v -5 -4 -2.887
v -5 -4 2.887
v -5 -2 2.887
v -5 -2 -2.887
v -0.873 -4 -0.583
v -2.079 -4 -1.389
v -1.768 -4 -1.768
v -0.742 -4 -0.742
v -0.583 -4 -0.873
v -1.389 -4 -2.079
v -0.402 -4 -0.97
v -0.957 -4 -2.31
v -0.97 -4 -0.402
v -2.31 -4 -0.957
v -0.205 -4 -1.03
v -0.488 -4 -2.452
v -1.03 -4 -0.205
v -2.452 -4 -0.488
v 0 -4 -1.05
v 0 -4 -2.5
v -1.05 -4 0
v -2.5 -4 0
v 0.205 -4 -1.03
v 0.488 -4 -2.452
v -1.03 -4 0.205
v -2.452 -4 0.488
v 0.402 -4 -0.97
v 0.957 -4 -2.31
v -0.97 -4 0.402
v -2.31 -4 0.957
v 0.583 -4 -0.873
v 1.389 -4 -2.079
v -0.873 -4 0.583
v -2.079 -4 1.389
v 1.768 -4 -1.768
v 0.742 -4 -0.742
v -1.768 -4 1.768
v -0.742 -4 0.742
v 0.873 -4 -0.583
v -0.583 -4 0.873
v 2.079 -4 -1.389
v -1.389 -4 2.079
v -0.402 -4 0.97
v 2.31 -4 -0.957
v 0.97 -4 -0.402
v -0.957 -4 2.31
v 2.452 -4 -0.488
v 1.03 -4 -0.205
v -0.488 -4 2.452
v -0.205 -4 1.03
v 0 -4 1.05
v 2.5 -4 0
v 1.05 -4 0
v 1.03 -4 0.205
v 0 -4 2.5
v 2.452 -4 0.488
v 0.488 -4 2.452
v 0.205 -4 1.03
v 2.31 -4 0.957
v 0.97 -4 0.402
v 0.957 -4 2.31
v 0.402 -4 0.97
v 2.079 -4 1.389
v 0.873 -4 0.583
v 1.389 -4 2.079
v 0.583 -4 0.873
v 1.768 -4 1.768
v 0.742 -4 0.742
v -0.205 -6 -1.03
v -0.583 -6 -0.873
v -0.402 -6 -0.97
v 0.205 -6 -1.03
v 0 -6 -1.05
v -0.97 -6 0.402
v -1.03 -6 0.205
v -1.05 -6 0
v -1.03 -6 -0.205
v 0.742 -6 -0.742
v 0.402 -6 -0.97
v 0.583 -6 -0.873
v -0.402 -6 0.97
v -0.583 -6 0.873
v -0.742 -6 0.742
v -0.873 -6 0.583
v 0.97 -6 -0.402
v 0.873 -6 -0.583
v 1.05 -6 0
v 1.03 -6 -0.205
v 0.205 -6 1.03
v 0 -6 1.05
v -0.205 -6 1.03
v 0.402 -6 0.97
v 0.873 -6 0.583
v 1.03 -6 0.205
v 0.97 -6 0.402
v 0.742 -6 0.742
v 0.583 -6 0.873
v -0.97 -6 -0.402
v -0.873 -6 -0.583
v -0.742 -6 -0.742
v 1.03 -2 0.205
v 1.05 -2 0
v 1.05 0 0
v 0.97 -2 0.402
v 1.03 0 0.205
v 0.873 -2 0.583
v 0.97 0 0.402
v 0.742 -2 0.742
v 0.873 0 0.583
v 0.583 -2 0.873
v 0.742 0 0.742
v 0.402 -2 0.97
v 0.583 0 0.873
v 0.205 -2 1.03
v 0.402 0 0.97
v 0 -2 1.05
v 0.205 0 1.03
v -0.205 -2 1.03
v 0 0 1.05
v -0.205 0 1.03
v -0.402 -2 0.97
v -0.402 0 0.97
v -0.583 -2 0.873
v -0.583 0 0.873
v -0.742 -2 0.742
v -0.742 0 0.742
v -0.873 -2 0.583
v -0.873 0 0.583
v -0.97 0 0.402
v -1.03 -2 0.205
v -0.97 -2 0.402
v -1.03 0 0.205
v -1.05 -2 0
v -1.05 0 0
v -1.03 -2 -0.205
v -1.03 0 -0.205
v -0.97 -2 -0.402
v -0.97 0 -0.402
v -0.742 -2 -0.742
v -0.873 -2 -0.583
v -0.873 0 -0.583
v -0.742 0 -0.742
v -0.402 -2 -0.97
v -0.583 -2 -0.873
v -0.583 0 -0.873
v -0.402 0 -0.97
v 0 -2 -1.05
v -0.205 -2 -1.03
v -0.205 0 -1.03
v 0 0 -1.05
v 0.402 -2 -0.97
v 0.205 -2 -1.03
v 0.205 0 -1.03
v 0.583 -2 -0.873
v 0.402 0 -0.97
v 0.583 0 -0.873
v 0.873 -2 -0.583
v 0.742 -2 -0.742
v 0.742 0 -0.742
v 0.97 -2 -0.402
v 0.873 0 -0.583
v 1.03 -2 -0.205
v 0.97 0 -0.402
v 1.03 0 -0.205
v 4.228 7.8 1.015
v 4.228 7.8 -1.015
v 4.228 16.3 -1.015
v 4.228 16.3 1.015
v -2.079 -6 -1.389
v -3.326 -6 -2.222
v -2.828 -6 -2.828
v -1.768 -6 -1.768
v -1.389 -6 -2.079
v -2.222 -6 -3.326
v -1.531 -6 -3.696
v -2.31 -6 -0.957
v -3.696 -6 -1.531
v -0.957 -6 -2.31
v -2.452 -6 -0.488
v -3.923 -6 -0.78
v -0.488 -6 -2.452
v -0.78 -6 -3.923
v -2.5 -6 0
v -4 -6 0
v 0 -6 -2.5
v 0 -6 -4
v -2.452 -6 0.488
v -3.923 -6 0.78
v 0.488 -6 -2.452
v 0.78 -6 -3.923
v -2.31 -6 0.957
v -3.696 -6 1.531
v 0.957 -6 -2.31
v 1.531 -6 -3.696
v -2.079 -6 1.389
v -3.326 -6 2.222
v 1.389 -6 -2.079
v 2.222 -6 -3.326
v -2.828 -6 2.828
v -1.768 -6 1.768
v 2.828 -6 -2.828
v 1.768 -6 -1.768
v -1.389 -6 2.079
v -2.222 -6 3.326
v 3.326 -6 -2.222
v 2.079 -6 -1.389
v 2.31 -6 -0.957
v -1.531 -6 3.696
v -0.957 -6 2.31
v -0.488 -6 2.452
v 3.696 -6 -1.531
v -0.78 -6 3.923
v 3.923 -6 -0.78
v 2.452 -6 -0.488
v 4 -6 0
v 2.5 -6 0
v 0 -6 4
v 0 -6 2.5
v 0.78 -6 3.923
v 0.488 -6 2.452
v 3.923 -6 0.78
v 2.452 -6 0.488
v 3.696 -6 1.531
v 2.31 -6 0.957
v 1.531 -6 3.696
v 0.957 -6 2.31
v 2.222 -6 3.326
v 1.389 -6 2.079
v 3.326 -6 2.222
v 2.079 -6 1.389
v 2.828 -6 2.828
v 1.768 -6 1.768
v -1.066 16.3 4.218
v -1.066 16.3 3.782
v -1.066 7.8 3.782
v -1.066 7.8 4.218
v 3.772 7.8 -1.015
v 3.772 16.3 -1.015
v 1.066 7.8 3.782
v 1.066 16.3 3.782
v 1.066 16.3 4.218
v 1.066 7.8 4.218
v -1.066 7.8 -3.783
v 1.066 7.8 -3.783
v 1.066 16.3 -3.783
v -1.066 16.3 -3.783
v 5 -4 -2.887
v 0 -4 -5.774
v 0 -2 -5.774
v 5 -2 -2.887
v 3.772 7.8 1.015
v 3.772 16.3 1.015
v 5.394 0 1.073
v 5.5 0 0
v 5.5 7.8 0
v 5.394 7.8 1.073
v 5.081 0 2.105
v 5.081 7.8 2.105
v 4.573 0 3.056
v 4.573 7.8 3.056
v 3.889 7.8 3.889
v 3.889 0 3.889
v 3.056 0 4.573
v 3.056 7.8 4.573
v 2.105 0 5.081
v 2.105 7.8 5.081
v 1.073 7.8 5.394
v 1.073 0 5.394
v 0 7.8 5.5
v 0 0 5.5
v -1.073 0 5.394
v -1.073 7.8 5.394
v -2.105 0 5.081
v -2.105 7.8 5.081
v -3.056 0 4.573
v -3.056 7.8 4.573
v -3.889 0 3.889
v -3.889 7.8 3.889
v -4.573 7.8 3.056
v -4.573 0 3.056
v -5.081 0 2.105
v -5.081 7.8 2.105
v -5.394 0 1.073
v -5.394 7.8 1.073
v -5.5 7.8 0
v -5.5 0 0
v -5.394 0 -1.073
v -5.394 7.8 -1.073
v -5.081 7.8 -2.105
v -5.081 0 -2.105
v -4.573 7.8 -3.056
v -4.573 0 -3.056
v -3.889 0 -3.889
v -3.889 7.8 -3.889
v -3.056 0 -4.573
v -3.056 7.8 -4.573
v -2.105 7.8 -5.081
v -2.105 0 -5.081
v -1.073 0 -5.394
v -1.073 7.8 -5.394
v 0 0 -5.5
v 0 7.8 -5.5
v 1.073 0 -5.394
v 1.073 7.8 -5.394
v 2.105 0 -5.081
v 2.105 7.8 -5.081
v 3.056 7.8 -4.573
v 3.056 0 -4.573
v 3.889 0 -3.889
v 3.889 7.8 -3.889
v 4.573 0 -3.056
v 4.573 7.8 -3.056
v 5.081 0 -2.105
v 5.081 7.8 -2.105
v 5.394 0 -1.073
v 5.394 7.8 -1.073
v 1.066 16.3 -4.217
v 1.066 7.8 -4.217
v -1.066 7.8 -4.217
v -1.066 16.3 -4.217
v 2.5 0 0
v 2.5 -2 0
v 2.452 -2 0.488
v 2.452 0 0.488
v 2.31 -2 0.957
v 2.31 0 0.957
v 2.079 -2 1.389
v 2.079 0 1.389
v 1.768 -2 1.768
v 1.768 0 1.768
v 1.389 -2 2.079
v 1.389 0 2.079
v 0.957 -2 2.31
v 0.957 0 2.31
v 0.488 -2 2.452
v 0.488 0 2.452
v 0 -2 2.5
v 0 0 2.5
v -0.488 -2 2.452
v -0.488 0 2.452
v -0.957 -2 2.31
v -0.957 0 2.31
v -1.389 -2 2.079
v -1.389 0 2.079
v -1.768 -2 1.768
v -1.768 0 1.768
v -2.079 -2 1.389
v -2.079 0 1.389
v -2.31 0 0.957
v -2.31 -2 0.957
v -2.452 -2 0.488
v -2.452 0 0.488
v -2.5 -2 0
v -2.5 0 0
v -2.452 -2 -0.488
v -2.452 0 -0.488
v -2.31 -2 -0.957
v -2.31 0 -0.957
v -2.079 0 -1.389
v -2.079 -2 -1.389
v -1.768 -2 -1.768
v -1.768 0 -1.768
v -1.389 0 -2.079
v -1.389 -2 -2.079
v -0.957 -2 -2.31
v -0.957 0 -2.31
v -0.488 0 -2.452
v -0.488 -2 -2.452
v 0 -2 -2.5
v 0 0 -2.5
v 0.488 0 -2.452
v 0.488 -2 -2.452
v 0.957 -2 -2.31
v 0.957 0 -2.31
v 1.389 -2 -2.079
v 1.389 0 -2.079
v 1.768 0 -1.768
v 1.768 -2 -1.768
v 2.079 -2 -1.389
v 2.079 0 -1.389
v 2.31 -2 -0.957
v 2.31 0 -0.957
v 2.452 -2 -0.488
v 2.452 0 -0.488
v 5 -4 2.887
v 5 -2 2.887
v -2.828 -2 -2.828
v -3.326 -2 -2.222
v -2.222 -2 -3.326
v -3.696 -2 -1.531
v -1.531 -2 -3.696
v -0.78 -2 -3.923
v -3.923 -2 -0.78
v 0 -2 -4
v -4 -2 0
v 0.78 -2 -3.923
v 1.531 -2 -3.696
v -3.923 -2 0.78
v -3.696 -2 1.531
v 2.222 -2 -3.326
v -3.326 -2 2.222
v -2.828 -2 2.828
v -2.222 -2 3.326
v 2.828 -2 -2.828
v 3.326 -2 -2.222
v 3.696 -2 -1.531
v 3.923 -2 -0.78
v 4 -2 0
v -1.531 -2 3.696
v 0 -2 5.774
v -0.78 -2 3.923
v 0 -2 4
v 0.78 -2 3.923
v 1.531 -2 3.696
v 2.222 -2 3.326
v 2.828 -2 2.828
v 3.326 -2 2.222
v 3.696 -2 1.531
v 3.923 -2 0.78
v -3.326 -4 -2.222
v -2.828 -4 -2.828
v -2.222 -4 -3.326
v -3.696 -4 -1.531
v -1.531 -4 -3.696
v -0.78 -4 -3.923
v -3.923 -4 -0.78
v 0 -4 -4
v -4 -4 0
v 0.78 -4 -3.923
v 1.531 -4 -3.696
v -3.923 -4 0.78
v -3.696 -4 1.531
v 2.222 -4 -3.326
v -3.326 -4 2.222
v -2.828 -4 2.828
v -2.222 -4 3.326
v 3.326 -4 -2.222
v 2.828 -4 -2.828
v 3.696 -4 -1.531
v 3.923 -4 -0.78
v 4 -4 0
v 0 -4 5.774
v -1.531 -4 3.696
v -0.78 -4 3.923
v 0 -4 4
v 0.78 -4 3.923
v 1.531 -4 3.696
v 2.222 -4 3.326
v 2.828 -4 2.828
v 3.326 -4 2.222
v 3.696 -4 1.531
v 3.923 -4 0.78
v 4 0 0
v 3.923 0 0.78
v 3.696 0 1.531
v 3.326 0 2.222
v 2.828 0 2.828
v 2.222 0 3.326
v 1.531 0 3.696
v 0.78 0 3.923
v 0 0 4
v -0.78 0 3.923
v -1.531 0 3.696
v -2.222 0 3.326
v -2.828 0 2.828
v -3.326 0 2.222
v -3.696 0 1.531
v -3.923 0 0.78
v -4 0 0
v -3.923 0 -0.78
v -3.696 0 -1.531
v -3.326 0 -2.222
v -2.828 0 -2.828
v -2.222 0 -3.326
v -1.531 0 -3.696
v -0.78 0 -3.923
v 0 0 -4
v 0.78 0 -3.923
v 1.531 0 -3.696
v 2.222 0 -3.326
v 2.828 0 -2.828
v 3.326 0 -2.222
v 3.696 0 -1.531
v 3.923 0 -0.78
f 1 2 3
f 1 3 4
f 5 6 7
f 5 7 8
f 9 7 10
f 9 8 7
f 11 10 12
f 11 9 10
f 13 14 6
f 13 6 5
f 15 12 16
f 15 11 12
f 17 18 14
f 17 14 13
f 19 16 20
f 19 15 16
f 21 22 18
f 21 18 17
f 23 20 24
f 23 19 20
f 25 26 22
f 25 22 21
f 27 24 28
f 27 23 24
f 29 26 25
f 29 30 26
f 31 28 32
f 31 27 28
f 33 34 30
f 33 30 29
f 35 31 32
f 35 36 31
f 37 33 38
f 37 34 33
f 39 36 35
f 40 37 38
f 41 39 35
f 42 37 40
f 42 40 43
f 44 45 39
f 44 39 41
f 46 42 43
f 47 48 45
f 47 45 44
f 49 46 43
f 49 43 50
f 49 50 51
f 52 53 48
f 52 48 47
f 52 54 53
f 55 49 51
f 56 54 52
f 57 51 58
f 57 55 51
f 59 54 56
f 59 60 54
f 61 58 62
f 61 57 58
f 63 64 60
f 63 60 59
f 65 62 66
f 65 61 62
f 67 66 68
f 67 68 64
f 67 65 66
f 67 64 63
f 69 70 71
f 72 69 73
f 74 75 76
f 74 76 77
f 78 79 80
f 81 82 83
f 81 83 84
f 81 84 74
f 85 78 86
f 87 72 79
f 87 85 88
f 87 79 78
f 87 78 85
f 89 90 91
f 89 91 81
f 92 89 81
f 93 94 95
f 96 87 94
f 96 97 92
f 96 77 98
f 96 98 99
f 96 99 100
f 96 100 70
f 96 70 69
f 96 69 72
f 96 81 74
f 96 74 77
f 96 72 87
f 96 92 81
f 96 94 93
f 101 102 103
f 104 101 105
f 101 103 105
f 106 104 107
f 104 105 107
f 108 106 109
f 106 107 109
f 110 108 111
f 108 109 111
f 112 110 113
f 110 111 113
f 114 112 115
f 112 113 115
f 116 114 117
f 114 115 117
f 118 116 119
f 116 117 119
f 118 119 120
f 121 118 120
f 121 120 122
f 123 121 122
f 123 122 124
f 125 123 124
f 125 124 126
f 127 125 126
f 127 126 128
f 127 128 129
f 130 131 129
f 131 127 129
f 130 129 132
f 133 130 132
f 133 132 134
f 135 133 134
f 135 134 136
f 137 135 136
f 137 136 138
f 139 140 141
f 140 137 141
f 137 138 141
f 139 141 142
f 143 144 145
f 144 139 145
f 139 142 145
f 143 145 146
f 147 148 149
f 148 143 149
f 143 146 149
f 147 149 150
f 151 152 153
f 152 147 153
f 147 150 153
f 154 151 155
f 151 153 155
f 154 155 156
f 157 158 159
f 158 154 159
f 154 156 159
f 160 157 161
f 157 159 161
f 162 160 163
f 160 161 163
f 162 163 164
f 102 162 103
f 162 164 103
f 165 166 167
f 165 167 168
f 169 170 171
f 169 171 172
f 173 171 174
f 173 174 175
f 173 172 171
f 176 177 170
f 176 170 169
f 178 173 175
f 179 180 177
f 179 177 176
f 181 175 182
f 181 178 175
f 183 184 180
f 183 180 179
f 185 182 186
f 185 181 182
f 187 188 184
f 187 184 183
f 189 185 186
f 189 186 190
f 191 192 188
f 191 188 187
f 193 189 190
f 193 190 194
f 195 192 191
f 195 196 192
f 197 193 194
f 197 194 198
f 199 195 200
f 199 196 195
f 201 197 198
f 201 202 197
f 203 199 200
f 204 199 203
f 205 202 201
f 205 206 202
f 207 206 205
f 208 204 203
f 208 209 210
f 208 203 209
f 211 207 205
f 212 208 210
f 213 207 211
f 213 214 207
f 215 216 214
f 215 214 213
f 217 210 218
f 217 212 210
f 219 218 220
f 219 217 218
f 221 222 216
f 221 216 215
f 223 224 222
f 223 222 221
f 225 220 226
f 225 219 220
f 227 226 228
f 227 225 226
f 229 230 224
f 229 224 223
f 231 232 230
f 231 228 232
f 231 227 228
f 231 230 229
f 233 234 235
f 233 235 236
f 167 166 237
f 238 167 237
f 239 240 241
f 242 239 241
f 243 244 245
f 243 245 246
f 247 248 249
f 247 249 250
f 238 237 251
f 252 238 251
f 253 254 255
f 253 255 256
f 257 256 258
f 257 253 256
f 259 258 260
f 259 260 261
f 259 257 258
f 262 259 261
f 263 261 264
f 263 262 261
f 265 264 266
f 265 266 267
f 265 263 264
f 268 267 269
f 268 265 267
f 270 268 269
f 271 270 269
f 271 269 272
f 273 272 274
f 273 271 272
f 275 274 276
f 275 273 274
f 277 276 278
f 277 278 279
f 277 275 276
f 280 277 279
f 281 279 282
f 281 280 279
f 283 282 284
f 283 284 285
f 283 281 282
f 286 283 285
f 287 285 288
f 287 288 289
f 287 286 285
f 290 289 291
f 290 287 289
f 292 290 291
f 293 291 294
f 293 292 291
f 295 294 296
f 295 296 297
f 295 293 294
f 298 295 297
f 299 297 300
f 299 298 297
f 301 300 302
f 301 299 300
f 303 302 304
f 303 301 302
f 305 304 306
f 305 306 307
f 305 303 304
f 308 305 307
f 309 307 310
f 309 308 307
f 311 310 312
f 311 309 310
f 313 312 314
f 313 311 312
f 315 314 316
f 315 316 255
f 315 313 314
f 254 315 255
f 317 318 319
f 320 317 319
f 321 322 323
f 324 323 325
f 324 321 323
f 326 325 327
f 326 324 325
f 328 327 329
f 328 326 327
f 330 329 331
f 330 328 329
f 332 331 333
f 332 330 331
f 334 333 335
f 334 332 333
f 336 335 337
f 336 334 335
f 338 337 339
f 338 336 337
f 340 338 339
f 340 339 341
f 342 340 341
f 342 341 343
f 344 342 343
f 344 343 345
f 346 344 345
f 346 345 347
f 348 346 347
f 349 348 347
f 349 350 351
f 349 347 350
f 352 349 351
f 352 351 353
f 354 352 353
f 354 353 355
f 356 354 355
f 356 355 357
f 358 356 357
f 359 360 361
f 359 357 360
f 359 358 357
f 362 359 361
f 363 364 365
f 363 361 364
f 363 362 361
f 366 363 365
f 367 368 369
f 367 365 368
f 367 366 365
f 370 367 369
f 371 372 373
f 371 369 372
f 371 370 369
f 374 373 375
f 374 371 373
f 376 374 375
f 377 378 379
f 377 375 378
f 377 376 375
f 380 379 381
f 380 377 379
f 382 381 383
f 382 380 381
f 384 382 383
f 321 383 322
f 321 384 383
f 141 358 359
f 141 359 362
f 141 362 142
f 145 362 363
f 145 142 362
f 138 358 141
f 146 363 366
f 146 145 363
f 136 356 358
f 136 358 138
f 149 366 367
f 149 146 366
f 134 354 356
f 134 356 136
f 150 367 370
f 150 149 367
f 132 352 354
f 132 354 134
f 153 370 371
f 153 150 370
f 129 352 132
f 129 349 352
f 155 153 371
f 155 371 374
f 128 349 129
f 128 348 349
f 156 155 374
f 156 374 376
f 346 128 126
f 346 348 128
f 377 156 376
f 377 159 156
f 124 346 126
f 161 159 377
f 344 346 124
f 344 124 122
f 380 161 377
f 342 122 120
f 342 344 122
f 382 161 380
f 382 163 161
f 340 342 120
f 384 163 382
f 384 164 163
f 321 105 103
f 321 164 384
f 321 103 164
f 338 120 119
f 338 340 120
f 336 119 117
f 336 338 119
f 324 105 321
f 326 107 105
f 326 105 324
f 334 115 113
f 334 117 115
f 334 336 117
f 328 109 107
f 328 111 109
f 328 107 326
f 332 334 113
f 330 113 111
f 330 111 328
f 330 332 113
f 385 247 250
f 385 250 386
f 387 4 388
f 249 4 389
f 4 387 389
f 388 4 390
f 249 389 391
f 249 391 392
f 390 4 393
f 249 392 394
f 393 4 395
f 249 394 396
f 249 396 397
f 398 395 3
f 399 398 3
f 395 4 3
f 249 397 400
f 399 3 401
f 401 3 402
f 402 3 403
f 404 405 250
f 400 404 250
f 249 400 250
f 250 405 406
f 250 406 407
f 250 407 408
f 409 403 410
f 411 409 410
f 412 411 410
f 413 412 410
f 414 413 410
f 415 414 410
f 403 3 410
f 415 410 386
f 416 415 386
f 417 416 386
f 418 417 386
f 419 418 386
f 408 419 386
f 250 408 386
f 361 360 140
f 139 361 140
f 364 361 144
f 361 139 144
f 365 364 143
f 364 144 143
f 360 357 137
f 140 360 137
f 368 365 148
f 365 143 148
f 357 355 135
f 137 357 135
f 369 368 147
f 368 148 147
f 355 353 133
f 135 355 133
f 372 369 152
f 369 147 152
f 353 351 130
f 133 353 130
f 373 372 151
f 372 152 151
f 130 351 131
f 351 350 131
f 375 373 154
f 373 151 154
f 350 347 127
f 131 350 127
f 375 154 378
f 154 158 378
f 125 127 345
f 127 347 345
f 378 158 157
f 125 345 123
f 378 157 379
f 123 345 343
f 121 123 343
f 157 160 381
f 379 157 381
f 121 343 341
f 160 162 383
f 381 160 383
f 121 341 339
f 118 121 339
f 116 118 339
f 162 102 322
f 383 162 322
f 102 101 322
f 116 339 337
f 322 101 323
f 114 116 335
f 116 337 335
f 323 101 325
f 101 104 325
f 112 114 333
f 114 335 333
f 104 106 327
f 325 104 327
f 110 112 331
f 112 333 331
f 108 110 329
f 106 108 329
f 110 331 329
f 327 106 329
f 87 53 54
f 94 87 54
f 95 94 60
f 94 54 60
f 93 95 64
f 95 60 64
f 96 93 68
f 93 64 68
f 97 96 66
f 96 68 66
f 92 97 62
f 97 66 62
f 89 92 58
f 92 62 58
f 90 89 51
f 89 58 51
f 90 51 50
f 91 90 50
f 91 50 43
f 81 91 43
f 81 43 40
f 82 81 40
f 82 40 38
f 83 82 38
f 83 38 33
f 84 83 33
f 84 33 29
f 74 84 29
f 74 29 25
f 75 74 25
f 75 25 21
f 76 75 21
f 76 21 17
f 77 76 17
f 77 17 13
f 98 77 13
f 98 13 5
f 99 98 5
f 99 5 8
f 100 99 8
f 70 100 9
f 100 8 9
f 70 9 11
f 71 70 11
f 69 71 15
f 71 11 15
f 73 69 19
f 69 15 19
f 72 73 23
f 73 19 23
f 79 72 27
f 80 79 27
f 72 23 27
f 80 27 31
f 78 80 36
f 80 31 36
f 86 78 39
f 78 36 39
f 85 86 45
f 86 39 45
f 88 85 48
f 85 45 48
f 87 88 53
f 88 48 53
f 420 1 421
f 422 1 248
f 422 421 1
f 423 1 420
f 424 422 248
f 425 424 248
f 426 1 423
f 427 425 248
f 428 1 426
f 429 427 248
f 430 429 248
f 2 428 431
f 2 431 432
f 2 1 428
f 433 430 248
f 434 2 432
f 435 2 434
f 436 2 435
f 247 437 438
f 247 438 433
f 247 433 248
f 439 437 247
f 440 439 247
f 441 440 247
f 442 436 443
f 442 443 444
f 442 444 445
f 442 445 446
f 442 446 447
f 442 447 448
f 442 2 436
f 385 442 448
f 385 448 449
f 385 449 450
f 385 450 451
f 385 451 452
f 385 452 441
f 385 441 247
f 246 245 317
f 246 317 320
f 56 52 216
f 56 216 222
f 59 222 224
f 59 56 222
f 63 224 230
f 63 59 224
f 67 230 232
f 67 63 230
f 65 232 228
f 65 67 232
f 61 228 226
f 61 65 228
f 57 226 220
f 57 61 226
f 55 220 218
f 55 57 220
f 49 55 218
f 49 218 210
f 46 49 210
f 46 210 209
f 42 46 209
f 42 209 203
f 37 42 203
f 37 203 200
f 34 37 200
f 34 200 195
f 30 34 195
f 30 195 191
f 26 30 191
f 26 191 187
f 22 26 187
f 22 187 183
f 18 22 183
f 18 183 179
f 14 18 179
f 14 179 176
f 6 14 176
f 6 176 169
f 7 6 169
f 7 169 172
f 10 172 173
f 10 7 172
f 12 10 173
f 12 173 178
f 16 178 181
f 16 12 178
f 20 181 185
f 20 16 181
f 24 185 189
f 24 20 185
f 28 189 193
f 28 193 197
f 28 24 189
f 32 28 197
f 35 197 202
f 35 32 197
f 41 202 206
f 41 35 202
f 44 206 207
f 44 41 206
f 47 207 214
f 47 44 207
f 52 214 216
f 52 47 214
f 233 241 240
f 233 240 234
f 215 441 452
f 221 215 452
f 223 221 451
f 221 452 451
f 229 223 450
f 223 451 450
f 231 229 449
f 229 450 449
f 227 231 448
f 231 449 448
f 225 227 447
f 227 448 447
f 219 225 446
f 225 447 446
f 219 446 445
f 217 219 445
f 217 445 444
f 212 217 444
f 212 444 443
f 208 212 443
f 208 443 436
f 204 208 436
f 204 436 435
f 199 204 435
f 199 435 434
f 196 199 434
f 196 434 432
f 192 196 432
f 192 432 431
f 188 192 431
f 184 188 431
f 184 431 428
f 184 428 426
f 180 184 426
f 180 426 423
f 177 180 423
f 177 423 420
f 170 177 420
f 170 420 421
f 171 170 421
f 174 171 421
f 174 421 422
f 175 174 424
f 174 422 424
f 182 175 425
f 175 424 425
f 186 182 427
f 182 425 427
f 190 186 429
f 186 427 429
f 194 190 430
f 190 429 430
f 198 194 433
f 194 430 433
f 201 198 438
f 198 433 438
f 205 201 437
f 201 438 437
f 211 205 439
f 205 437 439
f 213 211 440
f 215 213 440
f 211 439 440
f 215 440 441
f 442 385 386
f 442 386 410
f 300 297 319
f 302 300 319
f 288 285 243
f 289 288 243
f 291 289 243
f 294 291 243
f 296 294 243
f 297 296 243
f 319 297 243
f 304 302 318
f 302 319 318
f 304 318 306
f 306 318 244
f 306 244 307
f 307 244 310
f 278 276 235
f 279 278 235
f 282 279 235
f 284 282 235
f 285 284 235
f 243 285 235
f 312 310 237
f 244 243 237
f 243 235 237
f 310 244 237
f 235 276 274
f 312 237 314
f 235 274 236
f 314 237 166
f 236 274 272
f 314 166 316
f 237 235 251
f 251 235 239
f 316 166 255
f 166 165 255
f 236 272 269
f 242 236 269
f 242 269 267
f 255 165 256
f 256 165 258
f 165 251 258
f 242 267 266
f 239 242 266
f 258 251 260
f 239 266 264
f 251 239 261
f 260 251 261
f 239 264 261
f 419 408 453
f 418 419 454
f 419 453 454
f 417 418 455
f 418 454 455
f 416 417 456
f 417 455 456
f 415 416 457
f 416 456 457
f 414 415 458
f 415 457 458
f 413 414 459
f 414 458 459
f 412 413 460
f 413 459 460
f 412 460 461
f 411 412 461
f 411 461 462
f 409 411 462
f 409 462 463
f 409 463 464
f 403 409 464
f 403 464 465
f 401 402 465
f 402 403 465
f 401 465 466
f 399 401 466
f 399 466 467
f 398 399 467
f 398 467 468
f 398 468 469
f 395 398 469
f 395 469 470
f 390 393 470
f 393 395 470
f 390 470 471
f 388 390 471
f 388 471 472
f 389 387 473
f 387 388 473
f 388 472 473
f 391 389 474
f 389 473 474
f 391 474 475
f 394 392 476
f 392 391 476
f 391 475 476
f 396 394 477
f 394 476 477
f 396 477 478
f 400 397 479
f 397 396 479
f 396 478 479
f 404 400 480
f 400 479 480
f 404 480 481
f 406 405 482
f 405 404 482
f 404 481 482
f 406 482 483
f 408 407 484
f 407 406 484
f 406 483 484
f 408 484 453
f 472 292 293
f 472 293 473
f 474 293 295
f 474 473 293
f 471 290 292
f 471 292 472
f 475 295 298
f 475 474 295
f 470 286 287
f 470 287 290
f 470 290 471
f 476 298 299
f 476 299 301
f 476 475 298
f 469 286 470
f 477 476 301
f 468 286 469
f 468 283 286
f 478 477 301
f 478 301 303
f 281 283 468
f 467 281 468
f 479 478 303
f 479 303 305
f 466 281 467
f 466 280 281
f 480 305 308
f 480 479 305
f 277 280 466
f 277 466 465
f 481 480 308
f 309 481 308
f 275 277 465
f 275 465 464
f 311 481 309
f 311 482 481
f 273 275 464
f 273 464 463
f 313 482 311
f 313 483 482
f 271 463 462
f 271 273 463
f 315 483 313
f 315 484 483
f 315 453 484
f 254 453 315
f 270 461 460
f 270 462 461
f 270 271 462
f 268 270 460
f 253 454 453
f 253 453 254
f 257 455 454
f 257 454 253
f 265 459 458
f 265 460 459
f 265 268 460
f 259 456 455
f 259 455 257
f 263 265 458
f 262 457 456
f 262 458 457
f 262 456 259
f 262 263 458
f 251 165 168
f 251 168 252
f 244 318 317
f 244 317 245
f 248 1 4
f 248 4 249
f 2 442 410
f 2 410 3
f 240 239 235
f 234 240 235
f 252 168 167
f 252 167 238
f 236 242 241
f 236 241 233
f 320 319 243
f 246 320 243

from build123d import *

# Parameters (mm, degrees)
F0_R     = 5.5
F1_DEPTH = 7.8
F2_R     = 4
F2_R_2   = 2.5
F2_R_3   = 1.05
F3_DEPTH = 6
F6_DEPTH = 2
F7_W     = 0.456778
F7_H     = 2.030816
F7_W_2   = 2.131754
F7_H_2   = 0.43523
F7_H_3   = 0.434156
F8_DEPTH = 8.5


with BuildPart() as f1:
    # F0 (on Front) → F1 (new body)
    with BuildSketch(Plane.XZ):
        Circle(F0_R)
    extrude(amount=-F1_DEPTH)

    # F2 (on Front) → F3 (join)
    with BuildSketch(Plane.XZ):
        Circle(F2_R)
        Circle(F2_R_2, mode=Mode.SUBTRACT)
        Circle(F2_R_3)
    extrude(amount=F3_DEPTH)

    # F5 (on offset) → F6 (join)
    with BuildSketch(Plane.XZ.offset(4)):
        Polygon((5, -2.886751), (5, 2.886751), (0, 5.773503), (-5, 2.886751), (-5, -2.886751), (0, -5.773503), align=None)
    extrude(amount=-F6_DEPTH)

    # F7 (on face) → F8 (join)
    with BuildSketch(Plane(origin=(0, 7.8, 0), x_dir=(-1, 0, 0), z_dir=(0, 1, 0))):
        with Locations((-4, 0)):
            Rectangle(F7_W, F7_H)
        with Locations((0, 4)):
            Rectangle(F7_W_2, F7_H_2)
        with Locations((0, -4)):
            Rectangle(F7_W_2, F7_H_3)
    extrude(amount=F8_DEPTH)


solid = f1.part
